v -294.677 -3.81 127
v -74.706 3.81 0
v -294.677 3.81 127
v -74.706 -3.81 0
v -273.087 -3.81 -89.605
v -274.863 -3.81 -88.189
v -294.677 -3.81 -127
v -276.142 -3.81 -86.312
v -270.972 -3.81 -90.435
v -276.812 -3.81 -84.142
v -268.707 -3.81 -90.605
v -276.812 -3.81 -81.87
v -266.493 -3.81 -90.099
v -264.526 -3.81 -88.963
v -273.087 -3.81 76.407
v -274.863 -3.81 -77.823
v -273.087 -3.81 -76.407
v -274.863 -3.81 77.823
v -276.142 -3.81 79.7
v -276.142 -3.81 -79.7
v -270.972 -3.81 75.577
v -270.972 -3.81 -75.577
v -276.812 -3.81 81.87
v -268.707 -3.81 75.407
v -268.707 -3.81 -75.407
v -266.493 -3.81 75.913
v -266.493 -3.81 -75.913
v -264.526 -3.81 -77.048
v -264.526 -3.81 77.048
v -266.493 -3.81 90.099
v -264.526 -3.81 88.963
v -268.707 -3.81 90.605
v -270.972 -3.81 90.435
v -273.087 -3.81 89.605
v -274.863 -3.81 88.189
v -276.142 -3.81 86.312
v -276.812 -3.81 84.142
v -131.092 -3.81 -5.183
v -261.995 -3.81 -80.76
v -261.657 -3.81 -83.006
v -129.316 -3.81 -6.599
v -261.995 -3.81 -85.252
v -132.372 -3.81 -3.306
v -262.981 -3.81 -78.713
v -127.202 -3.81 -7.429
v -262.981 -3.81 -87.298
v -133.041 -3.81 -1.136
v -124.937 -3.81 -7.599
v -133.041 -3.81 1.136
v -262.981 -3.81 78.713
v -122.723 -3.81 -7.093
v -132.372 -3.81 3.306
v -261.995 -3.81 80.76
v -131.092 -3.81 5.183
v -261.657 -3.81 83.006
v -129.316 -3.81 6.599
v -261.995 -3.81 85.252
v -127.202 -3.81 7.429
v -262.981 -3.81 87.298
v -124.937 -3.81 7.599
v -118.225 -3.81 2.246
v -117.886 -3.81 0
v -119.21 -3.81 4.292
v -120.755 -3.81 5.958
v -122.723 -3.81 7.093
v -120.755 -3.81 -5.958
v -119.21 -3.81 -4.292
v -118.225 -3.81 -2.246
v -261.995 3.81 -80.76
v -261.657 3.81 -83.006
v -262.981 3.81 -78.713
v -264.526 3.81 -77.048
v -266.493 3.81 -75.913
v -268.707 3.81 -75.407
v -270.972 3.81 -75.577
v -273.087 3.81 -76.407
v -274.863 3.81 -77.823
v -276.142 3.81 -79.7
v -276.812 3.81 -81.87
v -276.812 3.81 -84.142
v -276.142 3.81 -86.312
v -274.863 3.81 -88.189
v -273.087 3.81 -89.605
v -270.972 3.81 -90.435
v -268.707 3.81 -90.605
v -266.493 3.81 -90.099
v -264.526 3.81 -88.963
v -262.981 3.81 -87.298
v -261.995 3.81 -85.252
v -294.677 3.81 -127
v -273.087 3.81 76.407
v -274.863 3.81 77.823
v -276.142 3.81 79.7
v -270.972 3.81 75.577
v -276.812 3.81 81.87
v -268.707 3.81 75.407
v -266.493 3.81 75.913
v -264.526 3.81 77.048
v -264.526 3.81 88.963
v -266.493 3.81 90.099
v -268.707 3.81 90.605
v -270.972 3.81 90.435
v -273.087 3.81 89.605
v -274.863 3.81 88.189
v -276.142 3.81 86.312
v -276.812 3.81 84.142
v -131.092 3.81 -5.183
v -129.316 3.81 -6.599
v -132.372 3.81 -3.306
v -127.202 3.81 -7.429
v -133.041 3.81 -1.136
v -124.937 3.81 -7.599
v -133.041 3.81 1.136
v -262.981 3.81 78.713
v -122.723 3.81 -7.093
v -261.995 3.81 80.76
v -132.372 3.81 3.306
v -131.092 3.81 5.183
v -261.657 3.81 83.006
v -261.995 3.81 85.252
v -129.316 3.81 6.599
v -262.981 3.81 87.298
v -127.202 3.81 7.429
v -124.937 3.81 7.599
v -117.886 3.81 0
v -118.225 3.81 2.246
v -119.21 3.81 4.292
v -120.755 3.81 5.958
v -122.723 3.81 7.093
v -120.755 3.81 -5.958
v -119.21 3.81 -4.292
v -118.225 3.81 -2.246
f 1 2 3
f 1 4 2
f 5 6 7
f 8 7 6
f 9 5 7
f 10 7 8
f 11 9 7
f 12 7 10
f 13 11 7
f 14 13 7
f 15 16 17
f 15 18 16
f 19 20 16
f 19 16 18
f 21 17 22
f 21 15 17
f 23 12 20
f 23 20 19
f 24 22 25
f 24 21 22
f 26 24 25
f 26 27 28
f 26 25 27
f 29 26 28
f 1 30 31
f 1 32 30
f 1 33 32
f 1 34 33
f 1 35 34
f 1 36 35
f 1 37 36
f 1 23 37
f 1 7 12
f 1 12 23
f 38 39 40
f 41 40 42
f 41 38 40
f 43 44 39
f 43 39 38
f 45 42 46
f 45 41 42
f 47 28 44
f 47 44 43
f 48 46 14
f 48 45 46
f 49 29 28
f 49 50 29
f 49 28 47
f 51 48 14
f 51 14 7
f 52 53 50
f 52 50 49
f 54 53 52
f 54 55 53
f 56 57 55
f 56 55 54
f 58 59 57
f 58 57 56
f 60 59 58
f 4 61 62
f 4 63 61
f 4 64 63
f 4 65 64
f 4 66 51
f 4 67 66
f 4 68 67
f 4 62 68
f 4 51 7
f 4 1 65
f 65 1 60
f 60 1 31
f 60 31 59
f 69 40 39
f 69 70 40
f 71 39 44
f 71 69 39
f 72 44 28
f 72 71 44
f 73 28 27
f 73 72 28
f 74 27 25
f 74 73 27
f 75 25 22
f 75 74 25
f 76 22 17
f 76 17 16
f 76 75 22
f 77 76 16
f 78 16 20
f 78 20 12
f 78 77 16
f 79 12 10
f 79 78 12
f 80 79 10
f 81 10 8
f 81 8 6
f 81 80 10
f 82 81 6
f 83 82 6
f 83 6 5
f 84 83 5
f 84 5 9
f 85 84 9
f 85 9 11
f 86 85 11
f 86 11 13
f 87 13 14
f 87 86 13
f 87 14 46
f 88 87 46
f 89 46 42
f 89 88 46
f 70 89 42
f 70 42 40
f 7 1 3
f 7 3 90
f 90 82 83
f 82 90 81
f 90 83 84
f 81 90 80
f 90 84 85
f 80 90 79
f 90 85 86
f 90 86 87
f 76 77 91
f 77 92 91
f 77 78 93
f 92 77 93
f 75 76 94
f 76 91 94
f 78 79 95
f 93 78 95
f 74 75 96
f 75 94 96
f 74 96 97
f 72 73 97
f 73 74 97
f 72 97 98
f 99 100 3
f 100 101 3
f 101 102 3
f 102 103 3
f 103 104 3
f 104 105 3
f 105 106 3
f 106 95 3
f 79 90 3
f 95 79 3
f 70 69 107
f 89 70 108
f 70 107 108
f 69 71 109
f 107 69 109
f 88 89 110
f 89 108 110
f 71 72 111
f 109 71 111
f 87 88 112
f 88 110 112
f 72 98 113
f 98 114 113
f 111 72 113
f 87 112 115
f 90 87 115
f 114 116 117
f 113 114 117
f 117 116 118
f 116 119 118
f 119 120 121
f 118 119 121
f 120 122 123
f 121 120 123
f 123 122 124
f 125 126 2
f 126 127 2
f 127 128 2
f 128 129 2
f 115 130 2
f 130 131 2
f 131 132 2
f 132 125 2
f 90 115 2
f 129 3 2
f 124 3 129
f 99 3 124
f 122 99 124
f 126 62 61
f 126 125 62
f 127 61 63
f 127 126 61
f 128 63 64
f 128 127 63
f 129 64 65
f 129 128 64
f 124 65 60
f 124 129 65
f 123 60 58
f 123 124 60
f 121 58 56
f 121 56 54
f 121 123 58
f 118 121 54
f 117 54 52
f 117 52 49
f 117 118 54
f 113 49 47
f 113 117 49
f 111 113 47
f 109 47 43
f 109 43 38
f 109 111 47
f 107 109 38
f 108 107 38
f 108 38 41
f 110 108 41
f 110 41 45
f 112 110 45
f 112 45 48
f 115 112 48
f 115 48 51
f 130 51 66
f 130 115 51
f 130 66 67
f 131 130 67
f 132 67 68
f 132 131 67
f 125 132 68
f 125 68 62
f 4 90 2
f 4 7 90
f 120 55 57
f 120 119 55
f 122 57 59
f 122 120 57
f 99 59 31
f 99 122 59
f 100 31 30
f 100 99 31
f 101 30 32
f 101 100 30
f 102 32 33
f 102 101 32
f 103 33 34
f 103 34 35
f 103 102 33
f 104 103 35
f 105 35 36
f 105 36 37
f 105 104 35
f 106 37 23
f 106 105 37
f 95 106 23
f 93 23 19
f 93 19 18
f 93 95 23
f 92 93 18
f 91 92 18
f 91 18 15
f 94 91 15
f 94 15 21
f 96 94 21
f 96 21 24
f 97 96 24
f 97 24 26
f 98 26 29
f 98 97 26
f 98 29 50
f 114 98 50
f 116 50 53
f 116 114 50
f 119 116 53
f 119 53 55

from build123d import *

# Parameters (mm, degrees)
F0_R     = 7.62
F1_DEPTH = 3.81
F2_DEPTH = 3.81


with BuildPart() as f1:
    # F0 (on Front) → F1 (new body, symmetric)
    with BuildSketch(Plane.XZ):
        Polygon((-74.70641, 0), (-294.676863, 127), (-294.676863, -127), align=None)
        with Locations((-269.276863, -83.005909)):
            Circle(F0_R, mode=Mode.SUBTRACT)
        with Locations((-269.276863, 83.005909)):
            Circle(F0_R, mode=Mode.SUBTRACT)
        with Locations((-125.50641, 0)):
            Circle(F0_R, mode=Mode.SUBTRACT)
    extrude(amount=F1_DEPTH, both=True)


with BuildPart() as f2:
    # F0 (on Front) → F2 (new body, symmetric)
    with BuildSketch(Plane.XZ):
        with Locations((-269.276863, 83.005909)):
            Circle(F0_R)
        with Locations((-125.50641, 0)):
            Circle(F0_R)
        with Locations((-269.276863, -83.005909)):
            Circle(F0_R)
    extrude(amount=F2_DEPTH, both=True)


with BuildPart() as f1_1:
    add(f1.part)

    # F3: cut F2
    add(f2.part, mode=Mode.SUBTRACT)


solid = f1_1.part
